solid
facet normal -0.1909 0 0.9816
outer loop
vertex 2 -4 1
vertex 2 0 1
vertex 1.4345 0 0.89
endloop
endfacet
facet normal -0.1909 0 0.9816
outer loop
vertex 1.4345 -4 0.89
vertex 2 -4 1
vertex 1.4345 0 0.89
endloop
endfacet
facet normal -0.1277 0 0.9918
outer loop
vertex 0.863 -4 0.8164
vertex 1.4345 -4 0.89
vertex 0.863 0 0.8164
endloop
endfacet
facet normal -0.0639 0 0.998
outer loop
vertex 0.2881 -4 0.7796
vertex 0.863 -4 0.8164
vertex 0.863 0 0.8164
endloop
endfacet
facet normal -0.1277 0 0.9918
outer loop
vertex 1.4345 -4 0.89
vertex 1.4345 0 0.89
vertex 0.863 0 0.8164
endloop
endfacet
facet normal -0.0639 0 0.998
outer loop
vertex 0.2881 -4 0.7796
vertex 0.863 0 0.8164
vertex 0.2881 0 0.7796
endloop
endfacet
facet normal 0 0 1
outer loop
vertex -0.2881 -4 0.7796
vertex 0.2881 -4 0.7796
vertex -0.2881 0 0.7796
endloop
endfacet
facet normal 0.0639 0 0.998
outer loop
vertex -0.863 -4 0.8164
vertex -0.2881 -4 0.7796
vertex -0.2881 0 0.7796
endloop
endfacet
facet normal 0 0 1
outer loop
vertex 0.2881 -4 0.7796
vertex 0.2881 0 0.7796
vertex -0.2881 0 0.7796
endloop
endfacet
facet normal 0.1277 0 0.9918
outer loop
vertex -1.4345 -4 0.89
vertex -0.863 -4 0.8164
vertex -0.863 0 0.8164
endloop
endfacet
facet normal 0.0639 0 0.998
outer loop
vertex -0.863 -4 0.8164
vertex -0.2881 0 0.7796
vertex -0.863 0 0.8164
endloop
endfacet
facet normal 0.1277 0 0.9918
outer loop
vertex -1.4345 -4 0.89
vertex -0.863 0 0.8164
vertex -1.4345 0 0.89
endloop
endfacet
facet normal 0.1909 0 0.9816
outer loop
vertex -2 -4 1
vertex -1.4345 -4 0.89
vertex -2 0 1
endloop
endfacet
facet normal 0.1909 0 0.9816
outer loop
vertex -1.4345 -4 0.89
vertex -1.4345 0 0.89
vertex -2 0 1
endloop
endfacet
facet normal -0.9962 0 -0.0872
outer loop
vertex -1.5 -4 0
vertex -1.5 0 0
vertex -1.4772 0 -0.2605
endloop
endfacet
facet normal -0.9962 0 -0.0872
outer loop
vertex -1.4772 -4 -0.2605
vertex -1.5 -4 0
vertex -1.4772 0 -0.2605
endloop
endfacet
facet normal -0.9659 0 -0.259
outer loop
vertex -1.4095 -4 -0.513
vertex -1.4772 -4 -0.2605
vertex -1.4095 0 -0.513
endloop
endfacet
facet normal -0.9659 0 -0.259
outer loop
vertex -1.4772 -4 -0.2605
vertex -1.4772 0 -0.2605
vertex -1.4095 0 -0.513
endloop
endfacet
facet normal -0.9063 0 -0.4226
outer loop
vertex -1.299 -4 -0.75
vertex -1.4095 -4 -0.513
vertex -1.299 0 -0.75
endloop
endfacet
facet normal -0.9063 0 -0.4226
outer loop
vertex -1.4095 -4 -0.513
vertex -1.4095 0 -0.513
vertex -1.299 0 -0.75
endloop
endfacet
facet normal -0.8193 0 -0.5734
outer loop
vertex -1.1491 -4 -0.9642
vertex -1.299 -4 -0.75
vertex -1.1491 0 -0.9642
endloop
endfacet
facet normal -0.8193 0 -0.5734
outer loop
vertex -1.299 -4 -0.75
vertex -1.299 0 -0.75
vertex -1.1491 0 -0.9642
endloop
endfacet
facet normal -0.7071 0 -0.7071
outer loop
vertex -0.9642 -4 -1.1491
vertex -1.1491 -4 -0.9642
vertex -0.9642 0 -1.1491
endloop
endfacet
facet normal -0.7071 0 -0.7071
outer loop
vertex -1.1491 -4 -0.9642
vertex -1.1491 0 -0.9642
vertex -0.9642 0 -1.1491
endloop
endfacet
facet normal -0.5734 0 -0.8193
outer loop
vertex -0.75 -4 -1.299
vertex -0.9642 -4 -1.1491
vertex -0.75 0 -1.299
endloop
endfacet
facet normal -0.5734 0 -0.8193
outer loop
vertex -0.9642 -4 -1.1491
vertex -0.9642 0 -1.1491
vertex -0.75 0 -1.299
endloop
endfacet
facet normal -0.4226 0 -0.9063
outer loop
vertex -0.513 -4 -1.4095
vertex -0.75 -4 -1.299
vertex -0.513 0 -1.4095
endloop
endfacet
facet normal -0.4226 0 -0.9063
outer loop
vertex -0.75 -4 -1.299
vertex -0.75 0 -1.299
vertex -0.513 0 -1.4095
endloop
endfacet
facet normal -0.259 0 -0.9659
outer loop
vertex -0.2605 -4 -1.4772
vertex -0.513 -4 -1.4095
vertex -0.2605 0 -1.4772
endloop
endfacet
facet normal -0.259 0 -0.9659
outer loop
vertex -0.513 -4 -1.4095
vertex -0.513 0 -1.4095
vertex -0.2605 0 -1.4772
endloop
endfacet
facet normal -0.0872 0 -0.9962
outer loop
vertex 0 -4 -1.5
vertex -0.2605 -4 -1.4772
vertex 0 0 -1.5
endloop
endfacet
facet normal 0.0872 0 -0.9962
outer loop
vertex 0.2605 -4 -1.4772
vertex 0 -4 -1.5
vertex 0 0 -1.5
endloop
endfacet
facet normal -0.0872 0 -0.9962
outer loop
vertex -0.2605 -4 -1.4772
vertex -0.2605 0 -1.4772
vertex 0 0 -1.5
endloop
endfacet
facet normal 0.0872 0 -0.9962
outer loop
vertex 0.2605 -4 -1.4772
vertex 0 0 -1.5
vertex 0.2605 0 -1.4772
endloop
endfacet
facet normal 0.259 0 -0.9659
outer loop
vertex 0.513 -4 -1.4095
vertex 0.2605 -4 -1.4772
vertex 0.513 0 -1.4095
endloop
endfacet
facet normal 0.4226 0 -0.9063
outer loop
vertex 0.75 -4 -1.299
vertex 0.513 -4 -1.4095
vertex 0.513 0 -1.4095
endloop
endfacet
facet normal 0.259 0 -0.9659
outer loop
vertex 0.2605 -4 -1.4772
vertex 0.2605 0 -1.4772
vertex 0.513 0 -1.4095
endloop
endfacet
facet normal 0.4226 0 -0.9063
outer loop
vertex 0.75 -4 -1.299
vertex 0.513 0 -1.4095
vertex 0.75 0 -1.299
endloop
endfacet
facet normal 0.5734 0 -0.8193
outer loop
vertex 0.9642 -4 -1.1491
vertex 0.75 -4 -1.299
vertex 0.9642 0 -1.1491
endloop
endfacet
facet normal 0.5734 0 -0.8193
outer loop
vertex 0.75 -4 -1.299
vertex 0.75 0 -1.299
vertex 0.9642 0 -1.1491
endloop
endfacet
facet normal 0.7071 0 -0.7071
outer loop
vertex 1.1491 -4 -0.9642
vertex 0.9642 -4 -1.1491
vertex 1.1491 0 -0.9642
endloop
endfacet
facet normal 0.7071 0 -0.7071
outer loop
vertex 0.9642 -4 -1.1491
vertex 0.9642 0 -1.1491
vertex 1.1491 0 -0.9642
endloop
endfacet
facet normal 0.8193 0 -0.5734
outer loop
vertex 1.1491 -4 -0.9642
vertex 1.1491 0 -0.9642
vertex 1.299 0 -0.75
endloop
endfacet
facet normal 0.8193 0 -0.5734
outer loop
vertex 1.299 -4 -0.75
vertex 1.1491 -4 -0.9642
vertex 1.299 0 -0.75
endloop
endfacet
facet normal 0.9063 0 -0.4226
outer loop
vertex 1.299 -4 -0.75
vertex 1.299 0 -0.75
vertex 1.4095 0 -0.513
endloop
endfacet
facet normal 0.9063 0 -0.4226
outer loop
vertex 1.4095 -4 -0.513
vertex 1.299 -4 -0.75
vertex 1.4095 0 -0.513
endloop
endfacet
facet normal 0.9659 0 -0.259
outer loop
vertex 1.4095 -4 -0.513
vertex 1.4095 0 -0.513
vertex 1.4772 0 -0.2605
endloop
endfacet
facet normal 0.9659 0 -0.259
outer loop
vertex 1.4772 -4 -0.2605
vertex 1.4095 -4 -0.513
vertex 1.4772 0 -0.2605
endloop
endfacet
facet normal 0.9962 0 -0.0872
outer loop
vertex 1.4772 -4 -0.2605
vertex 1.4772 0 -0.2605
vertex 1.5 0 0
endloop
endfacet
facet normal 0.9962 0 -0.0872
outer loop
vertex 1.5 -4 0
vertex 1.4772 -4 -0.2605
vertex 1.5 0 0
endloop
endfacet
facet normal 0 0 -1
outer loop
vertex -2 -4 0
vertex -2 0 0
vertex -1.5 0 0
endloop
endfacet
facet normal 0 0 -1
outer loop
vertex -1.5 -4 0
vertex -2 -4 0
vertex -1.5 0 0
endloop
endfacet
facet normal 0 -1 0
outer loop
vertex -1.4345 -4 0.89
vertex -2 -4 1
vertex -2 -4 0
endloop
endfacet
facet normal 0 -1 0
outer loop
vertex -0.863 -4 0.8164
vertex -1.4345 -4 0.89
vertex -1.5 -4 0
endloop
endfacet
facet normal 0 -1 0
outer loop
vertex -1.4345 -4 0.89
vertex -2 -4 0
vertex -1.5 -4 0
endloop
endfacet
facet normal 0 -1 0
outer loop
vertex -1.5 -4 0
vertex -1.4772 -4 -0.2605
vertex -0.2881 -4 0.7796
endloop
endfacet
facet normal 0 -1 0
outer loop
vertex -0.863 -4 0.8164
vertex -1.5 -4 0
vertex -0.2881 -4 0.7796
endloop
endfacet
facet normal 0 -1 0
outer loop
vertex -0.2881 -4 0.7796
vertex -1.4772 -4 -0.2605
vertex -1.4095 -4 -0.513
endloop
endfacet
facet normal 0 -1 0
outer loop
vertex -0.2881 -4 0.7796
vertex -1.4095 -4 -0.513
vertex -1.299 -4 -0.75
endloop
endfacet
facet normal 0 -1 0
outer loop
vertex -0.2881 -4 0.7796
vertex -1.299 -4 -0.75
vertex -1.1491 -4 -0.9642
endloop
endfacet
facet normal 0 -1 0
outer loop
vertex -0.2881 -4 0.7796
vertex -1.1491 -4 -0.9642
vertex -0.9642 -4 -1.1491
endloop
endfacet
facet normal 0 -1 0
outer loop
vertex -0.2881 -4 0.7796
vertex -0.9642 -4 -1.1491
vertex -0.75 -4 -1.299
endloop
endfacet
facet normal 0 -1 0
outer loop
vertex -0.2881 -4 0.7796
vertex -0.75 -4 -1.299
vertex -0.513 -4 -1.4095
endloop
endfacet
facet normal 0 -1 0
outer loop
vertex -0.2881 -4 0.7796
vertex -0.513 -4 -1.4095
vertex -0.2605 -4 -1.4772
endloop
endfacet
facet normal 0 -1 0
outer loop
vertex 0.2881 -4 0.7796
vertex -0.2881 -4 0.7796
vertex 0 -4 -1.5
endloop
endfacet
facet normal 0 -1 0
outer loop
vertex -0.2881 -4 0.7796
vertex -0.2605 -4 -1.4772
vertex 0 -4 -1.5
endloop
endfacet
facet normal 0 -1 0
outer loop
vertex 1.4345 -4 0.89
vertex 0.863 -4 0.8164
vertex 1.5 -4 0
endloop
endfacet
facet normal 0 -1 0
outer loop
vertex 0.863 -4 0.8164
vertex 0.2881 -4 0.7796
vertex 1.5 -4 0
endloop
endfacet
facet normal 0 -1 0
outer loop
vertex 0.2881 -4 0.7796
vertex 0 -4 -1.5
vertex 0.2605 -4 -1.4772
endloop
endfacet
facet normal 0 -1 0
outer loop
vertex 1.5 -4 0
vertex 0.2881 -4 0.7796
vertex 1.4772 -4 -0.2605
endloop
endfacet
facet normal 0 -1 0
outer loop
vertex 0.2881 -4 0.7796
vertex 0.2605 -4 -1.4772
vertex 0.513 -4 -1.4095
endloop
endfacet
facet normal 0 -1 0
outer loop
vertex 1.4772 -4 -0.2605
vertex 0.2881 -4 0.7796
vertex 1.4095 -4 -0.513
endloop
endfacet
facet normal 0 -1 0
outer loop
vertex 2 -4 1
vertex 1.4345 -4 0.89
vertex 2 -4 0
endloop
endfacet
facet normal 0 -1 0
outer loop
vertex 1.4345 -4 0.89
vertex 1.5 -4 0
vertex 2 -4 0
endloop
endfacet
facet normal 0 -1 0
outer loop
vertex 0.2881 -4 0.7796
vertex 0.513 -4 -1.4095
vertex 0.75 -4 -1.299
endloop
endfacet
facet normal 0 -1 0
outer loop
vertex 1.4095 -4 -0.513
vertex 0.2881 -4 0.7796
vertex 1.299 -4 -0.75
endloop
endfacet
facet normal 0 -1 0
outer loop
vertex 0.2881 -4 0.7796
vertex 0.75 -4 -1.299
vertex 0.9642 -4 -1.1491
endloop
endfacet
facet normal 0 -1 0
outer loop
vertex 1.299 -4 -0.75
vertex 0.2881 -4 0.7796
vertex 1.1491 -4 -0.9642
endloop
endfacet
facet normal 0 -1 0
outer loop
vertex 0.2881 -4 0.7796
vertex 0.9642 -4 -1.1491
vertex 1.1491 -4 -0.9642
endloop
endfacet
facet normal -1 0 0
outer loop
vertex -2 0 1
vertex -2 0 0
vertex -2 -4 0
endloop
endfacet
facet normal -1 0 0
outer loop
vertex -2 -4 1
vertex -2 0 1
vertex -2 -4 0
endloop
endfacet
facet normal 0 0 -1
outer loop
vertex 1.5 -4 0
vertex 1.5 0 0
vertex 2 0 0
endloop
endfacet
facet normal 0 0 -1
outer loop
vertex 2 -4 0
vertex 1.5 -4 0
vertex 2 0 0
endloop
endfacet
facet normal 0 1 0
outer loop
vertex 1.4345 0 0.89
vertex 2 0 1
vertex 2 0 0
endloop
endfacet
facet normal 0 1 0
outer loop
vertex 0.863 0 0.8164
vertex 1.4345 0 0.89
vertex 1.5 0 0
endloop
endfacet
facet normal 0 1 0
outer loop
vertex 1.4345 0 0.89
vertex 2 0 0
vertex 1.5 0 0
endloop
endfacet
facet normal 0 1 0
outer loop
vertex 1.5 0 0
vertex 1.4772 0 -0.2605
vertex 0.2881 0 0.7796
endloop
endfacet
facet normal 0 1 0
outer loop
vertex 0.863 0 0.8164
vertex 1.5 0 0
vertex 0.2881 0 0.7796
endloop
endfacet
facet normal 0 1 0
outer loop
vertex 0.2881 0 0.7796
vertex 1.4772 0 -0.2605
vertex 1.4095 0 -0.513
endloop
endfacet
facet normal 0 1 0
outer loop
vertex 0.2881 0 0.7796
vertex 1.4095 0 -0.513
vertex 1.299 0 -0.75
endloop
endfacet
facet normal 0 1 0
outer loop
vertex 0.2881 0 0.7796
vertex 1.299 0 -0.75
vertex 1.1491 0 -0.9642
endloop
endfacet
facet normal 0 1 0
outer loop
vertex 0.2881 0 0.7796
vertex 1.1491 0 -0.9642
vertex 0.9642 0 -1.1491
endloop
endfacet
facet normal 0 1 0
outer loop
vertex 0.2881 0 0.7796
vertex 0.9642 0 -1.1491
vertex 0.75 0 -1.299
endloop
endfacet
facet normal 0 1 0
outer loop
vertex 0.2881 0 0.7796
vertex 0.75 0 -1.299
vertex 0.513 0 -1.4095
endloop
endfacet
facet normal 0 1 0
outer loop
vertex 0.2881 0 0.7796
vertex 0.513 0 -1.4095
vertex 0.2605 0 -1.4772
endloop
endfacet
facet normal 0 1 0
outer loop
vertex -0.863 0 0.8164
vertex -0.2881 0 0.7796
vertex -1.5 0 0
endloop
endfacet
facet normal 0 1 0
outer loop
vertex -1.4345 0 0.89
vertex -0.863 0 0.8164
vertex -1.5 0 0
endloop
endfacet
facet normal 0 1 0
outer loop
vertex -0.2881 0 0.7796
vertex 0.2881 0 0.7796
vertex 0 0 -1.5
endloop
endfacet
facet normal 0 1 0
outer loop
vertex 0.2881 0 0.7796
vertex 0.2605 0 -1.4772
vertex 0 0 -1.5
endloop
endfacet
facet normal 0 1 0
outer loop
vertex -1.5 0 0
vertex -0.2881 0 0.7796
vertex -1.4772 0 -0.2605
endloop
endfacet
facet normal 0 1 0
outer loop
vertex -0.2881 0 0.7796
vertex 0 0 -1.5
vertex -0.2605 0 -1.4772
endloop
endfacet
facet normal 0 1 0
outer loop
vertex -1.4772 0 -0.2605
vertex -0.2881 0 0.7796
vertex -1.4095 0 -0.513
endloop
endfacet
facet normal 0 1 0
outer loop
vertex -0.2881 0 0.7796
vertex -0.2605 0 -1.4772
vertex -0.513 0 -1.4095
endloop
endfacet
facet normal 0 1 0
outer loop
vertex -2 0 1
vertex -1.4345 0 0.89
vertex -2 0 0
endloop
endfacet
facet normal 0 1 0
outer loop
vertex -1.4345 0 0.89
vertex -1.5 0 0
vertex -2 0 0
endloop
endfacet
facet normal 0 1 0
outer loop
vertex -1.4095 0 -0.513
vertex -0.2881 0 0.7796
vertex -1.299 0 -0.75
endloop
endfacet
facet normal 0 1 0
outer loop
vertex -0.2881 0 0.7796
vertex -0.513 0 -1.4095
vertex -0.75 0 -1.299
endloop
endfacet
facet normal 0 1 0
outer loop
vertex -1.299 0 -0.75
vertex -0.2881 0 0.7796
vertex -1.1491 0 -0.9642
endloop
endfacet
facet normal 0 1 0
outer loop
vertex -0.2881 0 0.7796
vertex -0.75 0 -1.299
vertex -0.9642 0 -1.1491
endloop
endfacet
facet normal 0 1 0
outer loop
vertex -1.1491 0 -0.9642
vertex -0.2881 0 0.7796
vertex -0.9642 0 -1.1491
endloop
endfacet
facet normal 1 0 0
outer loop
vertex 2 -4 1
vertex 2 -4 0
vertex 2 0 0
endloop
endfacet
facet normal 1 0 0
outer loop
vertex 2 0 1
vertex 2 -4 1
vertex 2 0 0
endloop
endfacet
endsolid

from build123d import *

# Parameters (mm, degrees)
F0_R     = 1.5
F1_DEPTH = 4
F3_DEPTH = 1
F4_W     = 10.043588
F4_H     = 9.757602
F5_DEPTH = 25
F7_DEPTH = 25


with BuildPart() as f1:
    # F0 (on Front) → F1 (new body)
    with BuildSketch(Plane.XZ):
        Circle(F0_R)
    extrude(amount=F1_DEPTH)

    # F2 (on Top) → F3 (join)
    with BuildSketch(Plane.XY):
        Polygon((2, 0), (0, 0), (0, -3), (0, -4), (2, -4), align=None)
        Polygon((0, -3), (0, 0), (-2, 0), (-2, -4), (0, -4), align=None)
    extrude(amount=F3_DEPTH)

    # F4 (on face) → F5 (cut)
    with BuildSketch(Plane.XY.offset(1)):
        with Locations((0.776296, -1.253996)):
            Rectangle(F4_W, F4_H)
    extrude(amount=F5_DEPTH, mode=Mode.SUBTRACT)

    # F6 (on face) → F7 (cut)
    with BuildSketch(Plane(origin=(0, 0, 0), x_dir=(-1, 0, 0), z_dir=(0, 1, 0))):
        with BuildLine():
            Line((-2.083411, 1.922662), (-2, 1))
            ThreePointArc((-2, 1), (0, 0.774964), (2, 1))
            Line((2, 1), (2, 1.922662))
            Line((2, 1.922662), (-2.083411, 1.922662))
        make_face()
    extrude(amount=-F7_DEPTH, mode=Mode.SUBTRACT)


solid = f1.part
